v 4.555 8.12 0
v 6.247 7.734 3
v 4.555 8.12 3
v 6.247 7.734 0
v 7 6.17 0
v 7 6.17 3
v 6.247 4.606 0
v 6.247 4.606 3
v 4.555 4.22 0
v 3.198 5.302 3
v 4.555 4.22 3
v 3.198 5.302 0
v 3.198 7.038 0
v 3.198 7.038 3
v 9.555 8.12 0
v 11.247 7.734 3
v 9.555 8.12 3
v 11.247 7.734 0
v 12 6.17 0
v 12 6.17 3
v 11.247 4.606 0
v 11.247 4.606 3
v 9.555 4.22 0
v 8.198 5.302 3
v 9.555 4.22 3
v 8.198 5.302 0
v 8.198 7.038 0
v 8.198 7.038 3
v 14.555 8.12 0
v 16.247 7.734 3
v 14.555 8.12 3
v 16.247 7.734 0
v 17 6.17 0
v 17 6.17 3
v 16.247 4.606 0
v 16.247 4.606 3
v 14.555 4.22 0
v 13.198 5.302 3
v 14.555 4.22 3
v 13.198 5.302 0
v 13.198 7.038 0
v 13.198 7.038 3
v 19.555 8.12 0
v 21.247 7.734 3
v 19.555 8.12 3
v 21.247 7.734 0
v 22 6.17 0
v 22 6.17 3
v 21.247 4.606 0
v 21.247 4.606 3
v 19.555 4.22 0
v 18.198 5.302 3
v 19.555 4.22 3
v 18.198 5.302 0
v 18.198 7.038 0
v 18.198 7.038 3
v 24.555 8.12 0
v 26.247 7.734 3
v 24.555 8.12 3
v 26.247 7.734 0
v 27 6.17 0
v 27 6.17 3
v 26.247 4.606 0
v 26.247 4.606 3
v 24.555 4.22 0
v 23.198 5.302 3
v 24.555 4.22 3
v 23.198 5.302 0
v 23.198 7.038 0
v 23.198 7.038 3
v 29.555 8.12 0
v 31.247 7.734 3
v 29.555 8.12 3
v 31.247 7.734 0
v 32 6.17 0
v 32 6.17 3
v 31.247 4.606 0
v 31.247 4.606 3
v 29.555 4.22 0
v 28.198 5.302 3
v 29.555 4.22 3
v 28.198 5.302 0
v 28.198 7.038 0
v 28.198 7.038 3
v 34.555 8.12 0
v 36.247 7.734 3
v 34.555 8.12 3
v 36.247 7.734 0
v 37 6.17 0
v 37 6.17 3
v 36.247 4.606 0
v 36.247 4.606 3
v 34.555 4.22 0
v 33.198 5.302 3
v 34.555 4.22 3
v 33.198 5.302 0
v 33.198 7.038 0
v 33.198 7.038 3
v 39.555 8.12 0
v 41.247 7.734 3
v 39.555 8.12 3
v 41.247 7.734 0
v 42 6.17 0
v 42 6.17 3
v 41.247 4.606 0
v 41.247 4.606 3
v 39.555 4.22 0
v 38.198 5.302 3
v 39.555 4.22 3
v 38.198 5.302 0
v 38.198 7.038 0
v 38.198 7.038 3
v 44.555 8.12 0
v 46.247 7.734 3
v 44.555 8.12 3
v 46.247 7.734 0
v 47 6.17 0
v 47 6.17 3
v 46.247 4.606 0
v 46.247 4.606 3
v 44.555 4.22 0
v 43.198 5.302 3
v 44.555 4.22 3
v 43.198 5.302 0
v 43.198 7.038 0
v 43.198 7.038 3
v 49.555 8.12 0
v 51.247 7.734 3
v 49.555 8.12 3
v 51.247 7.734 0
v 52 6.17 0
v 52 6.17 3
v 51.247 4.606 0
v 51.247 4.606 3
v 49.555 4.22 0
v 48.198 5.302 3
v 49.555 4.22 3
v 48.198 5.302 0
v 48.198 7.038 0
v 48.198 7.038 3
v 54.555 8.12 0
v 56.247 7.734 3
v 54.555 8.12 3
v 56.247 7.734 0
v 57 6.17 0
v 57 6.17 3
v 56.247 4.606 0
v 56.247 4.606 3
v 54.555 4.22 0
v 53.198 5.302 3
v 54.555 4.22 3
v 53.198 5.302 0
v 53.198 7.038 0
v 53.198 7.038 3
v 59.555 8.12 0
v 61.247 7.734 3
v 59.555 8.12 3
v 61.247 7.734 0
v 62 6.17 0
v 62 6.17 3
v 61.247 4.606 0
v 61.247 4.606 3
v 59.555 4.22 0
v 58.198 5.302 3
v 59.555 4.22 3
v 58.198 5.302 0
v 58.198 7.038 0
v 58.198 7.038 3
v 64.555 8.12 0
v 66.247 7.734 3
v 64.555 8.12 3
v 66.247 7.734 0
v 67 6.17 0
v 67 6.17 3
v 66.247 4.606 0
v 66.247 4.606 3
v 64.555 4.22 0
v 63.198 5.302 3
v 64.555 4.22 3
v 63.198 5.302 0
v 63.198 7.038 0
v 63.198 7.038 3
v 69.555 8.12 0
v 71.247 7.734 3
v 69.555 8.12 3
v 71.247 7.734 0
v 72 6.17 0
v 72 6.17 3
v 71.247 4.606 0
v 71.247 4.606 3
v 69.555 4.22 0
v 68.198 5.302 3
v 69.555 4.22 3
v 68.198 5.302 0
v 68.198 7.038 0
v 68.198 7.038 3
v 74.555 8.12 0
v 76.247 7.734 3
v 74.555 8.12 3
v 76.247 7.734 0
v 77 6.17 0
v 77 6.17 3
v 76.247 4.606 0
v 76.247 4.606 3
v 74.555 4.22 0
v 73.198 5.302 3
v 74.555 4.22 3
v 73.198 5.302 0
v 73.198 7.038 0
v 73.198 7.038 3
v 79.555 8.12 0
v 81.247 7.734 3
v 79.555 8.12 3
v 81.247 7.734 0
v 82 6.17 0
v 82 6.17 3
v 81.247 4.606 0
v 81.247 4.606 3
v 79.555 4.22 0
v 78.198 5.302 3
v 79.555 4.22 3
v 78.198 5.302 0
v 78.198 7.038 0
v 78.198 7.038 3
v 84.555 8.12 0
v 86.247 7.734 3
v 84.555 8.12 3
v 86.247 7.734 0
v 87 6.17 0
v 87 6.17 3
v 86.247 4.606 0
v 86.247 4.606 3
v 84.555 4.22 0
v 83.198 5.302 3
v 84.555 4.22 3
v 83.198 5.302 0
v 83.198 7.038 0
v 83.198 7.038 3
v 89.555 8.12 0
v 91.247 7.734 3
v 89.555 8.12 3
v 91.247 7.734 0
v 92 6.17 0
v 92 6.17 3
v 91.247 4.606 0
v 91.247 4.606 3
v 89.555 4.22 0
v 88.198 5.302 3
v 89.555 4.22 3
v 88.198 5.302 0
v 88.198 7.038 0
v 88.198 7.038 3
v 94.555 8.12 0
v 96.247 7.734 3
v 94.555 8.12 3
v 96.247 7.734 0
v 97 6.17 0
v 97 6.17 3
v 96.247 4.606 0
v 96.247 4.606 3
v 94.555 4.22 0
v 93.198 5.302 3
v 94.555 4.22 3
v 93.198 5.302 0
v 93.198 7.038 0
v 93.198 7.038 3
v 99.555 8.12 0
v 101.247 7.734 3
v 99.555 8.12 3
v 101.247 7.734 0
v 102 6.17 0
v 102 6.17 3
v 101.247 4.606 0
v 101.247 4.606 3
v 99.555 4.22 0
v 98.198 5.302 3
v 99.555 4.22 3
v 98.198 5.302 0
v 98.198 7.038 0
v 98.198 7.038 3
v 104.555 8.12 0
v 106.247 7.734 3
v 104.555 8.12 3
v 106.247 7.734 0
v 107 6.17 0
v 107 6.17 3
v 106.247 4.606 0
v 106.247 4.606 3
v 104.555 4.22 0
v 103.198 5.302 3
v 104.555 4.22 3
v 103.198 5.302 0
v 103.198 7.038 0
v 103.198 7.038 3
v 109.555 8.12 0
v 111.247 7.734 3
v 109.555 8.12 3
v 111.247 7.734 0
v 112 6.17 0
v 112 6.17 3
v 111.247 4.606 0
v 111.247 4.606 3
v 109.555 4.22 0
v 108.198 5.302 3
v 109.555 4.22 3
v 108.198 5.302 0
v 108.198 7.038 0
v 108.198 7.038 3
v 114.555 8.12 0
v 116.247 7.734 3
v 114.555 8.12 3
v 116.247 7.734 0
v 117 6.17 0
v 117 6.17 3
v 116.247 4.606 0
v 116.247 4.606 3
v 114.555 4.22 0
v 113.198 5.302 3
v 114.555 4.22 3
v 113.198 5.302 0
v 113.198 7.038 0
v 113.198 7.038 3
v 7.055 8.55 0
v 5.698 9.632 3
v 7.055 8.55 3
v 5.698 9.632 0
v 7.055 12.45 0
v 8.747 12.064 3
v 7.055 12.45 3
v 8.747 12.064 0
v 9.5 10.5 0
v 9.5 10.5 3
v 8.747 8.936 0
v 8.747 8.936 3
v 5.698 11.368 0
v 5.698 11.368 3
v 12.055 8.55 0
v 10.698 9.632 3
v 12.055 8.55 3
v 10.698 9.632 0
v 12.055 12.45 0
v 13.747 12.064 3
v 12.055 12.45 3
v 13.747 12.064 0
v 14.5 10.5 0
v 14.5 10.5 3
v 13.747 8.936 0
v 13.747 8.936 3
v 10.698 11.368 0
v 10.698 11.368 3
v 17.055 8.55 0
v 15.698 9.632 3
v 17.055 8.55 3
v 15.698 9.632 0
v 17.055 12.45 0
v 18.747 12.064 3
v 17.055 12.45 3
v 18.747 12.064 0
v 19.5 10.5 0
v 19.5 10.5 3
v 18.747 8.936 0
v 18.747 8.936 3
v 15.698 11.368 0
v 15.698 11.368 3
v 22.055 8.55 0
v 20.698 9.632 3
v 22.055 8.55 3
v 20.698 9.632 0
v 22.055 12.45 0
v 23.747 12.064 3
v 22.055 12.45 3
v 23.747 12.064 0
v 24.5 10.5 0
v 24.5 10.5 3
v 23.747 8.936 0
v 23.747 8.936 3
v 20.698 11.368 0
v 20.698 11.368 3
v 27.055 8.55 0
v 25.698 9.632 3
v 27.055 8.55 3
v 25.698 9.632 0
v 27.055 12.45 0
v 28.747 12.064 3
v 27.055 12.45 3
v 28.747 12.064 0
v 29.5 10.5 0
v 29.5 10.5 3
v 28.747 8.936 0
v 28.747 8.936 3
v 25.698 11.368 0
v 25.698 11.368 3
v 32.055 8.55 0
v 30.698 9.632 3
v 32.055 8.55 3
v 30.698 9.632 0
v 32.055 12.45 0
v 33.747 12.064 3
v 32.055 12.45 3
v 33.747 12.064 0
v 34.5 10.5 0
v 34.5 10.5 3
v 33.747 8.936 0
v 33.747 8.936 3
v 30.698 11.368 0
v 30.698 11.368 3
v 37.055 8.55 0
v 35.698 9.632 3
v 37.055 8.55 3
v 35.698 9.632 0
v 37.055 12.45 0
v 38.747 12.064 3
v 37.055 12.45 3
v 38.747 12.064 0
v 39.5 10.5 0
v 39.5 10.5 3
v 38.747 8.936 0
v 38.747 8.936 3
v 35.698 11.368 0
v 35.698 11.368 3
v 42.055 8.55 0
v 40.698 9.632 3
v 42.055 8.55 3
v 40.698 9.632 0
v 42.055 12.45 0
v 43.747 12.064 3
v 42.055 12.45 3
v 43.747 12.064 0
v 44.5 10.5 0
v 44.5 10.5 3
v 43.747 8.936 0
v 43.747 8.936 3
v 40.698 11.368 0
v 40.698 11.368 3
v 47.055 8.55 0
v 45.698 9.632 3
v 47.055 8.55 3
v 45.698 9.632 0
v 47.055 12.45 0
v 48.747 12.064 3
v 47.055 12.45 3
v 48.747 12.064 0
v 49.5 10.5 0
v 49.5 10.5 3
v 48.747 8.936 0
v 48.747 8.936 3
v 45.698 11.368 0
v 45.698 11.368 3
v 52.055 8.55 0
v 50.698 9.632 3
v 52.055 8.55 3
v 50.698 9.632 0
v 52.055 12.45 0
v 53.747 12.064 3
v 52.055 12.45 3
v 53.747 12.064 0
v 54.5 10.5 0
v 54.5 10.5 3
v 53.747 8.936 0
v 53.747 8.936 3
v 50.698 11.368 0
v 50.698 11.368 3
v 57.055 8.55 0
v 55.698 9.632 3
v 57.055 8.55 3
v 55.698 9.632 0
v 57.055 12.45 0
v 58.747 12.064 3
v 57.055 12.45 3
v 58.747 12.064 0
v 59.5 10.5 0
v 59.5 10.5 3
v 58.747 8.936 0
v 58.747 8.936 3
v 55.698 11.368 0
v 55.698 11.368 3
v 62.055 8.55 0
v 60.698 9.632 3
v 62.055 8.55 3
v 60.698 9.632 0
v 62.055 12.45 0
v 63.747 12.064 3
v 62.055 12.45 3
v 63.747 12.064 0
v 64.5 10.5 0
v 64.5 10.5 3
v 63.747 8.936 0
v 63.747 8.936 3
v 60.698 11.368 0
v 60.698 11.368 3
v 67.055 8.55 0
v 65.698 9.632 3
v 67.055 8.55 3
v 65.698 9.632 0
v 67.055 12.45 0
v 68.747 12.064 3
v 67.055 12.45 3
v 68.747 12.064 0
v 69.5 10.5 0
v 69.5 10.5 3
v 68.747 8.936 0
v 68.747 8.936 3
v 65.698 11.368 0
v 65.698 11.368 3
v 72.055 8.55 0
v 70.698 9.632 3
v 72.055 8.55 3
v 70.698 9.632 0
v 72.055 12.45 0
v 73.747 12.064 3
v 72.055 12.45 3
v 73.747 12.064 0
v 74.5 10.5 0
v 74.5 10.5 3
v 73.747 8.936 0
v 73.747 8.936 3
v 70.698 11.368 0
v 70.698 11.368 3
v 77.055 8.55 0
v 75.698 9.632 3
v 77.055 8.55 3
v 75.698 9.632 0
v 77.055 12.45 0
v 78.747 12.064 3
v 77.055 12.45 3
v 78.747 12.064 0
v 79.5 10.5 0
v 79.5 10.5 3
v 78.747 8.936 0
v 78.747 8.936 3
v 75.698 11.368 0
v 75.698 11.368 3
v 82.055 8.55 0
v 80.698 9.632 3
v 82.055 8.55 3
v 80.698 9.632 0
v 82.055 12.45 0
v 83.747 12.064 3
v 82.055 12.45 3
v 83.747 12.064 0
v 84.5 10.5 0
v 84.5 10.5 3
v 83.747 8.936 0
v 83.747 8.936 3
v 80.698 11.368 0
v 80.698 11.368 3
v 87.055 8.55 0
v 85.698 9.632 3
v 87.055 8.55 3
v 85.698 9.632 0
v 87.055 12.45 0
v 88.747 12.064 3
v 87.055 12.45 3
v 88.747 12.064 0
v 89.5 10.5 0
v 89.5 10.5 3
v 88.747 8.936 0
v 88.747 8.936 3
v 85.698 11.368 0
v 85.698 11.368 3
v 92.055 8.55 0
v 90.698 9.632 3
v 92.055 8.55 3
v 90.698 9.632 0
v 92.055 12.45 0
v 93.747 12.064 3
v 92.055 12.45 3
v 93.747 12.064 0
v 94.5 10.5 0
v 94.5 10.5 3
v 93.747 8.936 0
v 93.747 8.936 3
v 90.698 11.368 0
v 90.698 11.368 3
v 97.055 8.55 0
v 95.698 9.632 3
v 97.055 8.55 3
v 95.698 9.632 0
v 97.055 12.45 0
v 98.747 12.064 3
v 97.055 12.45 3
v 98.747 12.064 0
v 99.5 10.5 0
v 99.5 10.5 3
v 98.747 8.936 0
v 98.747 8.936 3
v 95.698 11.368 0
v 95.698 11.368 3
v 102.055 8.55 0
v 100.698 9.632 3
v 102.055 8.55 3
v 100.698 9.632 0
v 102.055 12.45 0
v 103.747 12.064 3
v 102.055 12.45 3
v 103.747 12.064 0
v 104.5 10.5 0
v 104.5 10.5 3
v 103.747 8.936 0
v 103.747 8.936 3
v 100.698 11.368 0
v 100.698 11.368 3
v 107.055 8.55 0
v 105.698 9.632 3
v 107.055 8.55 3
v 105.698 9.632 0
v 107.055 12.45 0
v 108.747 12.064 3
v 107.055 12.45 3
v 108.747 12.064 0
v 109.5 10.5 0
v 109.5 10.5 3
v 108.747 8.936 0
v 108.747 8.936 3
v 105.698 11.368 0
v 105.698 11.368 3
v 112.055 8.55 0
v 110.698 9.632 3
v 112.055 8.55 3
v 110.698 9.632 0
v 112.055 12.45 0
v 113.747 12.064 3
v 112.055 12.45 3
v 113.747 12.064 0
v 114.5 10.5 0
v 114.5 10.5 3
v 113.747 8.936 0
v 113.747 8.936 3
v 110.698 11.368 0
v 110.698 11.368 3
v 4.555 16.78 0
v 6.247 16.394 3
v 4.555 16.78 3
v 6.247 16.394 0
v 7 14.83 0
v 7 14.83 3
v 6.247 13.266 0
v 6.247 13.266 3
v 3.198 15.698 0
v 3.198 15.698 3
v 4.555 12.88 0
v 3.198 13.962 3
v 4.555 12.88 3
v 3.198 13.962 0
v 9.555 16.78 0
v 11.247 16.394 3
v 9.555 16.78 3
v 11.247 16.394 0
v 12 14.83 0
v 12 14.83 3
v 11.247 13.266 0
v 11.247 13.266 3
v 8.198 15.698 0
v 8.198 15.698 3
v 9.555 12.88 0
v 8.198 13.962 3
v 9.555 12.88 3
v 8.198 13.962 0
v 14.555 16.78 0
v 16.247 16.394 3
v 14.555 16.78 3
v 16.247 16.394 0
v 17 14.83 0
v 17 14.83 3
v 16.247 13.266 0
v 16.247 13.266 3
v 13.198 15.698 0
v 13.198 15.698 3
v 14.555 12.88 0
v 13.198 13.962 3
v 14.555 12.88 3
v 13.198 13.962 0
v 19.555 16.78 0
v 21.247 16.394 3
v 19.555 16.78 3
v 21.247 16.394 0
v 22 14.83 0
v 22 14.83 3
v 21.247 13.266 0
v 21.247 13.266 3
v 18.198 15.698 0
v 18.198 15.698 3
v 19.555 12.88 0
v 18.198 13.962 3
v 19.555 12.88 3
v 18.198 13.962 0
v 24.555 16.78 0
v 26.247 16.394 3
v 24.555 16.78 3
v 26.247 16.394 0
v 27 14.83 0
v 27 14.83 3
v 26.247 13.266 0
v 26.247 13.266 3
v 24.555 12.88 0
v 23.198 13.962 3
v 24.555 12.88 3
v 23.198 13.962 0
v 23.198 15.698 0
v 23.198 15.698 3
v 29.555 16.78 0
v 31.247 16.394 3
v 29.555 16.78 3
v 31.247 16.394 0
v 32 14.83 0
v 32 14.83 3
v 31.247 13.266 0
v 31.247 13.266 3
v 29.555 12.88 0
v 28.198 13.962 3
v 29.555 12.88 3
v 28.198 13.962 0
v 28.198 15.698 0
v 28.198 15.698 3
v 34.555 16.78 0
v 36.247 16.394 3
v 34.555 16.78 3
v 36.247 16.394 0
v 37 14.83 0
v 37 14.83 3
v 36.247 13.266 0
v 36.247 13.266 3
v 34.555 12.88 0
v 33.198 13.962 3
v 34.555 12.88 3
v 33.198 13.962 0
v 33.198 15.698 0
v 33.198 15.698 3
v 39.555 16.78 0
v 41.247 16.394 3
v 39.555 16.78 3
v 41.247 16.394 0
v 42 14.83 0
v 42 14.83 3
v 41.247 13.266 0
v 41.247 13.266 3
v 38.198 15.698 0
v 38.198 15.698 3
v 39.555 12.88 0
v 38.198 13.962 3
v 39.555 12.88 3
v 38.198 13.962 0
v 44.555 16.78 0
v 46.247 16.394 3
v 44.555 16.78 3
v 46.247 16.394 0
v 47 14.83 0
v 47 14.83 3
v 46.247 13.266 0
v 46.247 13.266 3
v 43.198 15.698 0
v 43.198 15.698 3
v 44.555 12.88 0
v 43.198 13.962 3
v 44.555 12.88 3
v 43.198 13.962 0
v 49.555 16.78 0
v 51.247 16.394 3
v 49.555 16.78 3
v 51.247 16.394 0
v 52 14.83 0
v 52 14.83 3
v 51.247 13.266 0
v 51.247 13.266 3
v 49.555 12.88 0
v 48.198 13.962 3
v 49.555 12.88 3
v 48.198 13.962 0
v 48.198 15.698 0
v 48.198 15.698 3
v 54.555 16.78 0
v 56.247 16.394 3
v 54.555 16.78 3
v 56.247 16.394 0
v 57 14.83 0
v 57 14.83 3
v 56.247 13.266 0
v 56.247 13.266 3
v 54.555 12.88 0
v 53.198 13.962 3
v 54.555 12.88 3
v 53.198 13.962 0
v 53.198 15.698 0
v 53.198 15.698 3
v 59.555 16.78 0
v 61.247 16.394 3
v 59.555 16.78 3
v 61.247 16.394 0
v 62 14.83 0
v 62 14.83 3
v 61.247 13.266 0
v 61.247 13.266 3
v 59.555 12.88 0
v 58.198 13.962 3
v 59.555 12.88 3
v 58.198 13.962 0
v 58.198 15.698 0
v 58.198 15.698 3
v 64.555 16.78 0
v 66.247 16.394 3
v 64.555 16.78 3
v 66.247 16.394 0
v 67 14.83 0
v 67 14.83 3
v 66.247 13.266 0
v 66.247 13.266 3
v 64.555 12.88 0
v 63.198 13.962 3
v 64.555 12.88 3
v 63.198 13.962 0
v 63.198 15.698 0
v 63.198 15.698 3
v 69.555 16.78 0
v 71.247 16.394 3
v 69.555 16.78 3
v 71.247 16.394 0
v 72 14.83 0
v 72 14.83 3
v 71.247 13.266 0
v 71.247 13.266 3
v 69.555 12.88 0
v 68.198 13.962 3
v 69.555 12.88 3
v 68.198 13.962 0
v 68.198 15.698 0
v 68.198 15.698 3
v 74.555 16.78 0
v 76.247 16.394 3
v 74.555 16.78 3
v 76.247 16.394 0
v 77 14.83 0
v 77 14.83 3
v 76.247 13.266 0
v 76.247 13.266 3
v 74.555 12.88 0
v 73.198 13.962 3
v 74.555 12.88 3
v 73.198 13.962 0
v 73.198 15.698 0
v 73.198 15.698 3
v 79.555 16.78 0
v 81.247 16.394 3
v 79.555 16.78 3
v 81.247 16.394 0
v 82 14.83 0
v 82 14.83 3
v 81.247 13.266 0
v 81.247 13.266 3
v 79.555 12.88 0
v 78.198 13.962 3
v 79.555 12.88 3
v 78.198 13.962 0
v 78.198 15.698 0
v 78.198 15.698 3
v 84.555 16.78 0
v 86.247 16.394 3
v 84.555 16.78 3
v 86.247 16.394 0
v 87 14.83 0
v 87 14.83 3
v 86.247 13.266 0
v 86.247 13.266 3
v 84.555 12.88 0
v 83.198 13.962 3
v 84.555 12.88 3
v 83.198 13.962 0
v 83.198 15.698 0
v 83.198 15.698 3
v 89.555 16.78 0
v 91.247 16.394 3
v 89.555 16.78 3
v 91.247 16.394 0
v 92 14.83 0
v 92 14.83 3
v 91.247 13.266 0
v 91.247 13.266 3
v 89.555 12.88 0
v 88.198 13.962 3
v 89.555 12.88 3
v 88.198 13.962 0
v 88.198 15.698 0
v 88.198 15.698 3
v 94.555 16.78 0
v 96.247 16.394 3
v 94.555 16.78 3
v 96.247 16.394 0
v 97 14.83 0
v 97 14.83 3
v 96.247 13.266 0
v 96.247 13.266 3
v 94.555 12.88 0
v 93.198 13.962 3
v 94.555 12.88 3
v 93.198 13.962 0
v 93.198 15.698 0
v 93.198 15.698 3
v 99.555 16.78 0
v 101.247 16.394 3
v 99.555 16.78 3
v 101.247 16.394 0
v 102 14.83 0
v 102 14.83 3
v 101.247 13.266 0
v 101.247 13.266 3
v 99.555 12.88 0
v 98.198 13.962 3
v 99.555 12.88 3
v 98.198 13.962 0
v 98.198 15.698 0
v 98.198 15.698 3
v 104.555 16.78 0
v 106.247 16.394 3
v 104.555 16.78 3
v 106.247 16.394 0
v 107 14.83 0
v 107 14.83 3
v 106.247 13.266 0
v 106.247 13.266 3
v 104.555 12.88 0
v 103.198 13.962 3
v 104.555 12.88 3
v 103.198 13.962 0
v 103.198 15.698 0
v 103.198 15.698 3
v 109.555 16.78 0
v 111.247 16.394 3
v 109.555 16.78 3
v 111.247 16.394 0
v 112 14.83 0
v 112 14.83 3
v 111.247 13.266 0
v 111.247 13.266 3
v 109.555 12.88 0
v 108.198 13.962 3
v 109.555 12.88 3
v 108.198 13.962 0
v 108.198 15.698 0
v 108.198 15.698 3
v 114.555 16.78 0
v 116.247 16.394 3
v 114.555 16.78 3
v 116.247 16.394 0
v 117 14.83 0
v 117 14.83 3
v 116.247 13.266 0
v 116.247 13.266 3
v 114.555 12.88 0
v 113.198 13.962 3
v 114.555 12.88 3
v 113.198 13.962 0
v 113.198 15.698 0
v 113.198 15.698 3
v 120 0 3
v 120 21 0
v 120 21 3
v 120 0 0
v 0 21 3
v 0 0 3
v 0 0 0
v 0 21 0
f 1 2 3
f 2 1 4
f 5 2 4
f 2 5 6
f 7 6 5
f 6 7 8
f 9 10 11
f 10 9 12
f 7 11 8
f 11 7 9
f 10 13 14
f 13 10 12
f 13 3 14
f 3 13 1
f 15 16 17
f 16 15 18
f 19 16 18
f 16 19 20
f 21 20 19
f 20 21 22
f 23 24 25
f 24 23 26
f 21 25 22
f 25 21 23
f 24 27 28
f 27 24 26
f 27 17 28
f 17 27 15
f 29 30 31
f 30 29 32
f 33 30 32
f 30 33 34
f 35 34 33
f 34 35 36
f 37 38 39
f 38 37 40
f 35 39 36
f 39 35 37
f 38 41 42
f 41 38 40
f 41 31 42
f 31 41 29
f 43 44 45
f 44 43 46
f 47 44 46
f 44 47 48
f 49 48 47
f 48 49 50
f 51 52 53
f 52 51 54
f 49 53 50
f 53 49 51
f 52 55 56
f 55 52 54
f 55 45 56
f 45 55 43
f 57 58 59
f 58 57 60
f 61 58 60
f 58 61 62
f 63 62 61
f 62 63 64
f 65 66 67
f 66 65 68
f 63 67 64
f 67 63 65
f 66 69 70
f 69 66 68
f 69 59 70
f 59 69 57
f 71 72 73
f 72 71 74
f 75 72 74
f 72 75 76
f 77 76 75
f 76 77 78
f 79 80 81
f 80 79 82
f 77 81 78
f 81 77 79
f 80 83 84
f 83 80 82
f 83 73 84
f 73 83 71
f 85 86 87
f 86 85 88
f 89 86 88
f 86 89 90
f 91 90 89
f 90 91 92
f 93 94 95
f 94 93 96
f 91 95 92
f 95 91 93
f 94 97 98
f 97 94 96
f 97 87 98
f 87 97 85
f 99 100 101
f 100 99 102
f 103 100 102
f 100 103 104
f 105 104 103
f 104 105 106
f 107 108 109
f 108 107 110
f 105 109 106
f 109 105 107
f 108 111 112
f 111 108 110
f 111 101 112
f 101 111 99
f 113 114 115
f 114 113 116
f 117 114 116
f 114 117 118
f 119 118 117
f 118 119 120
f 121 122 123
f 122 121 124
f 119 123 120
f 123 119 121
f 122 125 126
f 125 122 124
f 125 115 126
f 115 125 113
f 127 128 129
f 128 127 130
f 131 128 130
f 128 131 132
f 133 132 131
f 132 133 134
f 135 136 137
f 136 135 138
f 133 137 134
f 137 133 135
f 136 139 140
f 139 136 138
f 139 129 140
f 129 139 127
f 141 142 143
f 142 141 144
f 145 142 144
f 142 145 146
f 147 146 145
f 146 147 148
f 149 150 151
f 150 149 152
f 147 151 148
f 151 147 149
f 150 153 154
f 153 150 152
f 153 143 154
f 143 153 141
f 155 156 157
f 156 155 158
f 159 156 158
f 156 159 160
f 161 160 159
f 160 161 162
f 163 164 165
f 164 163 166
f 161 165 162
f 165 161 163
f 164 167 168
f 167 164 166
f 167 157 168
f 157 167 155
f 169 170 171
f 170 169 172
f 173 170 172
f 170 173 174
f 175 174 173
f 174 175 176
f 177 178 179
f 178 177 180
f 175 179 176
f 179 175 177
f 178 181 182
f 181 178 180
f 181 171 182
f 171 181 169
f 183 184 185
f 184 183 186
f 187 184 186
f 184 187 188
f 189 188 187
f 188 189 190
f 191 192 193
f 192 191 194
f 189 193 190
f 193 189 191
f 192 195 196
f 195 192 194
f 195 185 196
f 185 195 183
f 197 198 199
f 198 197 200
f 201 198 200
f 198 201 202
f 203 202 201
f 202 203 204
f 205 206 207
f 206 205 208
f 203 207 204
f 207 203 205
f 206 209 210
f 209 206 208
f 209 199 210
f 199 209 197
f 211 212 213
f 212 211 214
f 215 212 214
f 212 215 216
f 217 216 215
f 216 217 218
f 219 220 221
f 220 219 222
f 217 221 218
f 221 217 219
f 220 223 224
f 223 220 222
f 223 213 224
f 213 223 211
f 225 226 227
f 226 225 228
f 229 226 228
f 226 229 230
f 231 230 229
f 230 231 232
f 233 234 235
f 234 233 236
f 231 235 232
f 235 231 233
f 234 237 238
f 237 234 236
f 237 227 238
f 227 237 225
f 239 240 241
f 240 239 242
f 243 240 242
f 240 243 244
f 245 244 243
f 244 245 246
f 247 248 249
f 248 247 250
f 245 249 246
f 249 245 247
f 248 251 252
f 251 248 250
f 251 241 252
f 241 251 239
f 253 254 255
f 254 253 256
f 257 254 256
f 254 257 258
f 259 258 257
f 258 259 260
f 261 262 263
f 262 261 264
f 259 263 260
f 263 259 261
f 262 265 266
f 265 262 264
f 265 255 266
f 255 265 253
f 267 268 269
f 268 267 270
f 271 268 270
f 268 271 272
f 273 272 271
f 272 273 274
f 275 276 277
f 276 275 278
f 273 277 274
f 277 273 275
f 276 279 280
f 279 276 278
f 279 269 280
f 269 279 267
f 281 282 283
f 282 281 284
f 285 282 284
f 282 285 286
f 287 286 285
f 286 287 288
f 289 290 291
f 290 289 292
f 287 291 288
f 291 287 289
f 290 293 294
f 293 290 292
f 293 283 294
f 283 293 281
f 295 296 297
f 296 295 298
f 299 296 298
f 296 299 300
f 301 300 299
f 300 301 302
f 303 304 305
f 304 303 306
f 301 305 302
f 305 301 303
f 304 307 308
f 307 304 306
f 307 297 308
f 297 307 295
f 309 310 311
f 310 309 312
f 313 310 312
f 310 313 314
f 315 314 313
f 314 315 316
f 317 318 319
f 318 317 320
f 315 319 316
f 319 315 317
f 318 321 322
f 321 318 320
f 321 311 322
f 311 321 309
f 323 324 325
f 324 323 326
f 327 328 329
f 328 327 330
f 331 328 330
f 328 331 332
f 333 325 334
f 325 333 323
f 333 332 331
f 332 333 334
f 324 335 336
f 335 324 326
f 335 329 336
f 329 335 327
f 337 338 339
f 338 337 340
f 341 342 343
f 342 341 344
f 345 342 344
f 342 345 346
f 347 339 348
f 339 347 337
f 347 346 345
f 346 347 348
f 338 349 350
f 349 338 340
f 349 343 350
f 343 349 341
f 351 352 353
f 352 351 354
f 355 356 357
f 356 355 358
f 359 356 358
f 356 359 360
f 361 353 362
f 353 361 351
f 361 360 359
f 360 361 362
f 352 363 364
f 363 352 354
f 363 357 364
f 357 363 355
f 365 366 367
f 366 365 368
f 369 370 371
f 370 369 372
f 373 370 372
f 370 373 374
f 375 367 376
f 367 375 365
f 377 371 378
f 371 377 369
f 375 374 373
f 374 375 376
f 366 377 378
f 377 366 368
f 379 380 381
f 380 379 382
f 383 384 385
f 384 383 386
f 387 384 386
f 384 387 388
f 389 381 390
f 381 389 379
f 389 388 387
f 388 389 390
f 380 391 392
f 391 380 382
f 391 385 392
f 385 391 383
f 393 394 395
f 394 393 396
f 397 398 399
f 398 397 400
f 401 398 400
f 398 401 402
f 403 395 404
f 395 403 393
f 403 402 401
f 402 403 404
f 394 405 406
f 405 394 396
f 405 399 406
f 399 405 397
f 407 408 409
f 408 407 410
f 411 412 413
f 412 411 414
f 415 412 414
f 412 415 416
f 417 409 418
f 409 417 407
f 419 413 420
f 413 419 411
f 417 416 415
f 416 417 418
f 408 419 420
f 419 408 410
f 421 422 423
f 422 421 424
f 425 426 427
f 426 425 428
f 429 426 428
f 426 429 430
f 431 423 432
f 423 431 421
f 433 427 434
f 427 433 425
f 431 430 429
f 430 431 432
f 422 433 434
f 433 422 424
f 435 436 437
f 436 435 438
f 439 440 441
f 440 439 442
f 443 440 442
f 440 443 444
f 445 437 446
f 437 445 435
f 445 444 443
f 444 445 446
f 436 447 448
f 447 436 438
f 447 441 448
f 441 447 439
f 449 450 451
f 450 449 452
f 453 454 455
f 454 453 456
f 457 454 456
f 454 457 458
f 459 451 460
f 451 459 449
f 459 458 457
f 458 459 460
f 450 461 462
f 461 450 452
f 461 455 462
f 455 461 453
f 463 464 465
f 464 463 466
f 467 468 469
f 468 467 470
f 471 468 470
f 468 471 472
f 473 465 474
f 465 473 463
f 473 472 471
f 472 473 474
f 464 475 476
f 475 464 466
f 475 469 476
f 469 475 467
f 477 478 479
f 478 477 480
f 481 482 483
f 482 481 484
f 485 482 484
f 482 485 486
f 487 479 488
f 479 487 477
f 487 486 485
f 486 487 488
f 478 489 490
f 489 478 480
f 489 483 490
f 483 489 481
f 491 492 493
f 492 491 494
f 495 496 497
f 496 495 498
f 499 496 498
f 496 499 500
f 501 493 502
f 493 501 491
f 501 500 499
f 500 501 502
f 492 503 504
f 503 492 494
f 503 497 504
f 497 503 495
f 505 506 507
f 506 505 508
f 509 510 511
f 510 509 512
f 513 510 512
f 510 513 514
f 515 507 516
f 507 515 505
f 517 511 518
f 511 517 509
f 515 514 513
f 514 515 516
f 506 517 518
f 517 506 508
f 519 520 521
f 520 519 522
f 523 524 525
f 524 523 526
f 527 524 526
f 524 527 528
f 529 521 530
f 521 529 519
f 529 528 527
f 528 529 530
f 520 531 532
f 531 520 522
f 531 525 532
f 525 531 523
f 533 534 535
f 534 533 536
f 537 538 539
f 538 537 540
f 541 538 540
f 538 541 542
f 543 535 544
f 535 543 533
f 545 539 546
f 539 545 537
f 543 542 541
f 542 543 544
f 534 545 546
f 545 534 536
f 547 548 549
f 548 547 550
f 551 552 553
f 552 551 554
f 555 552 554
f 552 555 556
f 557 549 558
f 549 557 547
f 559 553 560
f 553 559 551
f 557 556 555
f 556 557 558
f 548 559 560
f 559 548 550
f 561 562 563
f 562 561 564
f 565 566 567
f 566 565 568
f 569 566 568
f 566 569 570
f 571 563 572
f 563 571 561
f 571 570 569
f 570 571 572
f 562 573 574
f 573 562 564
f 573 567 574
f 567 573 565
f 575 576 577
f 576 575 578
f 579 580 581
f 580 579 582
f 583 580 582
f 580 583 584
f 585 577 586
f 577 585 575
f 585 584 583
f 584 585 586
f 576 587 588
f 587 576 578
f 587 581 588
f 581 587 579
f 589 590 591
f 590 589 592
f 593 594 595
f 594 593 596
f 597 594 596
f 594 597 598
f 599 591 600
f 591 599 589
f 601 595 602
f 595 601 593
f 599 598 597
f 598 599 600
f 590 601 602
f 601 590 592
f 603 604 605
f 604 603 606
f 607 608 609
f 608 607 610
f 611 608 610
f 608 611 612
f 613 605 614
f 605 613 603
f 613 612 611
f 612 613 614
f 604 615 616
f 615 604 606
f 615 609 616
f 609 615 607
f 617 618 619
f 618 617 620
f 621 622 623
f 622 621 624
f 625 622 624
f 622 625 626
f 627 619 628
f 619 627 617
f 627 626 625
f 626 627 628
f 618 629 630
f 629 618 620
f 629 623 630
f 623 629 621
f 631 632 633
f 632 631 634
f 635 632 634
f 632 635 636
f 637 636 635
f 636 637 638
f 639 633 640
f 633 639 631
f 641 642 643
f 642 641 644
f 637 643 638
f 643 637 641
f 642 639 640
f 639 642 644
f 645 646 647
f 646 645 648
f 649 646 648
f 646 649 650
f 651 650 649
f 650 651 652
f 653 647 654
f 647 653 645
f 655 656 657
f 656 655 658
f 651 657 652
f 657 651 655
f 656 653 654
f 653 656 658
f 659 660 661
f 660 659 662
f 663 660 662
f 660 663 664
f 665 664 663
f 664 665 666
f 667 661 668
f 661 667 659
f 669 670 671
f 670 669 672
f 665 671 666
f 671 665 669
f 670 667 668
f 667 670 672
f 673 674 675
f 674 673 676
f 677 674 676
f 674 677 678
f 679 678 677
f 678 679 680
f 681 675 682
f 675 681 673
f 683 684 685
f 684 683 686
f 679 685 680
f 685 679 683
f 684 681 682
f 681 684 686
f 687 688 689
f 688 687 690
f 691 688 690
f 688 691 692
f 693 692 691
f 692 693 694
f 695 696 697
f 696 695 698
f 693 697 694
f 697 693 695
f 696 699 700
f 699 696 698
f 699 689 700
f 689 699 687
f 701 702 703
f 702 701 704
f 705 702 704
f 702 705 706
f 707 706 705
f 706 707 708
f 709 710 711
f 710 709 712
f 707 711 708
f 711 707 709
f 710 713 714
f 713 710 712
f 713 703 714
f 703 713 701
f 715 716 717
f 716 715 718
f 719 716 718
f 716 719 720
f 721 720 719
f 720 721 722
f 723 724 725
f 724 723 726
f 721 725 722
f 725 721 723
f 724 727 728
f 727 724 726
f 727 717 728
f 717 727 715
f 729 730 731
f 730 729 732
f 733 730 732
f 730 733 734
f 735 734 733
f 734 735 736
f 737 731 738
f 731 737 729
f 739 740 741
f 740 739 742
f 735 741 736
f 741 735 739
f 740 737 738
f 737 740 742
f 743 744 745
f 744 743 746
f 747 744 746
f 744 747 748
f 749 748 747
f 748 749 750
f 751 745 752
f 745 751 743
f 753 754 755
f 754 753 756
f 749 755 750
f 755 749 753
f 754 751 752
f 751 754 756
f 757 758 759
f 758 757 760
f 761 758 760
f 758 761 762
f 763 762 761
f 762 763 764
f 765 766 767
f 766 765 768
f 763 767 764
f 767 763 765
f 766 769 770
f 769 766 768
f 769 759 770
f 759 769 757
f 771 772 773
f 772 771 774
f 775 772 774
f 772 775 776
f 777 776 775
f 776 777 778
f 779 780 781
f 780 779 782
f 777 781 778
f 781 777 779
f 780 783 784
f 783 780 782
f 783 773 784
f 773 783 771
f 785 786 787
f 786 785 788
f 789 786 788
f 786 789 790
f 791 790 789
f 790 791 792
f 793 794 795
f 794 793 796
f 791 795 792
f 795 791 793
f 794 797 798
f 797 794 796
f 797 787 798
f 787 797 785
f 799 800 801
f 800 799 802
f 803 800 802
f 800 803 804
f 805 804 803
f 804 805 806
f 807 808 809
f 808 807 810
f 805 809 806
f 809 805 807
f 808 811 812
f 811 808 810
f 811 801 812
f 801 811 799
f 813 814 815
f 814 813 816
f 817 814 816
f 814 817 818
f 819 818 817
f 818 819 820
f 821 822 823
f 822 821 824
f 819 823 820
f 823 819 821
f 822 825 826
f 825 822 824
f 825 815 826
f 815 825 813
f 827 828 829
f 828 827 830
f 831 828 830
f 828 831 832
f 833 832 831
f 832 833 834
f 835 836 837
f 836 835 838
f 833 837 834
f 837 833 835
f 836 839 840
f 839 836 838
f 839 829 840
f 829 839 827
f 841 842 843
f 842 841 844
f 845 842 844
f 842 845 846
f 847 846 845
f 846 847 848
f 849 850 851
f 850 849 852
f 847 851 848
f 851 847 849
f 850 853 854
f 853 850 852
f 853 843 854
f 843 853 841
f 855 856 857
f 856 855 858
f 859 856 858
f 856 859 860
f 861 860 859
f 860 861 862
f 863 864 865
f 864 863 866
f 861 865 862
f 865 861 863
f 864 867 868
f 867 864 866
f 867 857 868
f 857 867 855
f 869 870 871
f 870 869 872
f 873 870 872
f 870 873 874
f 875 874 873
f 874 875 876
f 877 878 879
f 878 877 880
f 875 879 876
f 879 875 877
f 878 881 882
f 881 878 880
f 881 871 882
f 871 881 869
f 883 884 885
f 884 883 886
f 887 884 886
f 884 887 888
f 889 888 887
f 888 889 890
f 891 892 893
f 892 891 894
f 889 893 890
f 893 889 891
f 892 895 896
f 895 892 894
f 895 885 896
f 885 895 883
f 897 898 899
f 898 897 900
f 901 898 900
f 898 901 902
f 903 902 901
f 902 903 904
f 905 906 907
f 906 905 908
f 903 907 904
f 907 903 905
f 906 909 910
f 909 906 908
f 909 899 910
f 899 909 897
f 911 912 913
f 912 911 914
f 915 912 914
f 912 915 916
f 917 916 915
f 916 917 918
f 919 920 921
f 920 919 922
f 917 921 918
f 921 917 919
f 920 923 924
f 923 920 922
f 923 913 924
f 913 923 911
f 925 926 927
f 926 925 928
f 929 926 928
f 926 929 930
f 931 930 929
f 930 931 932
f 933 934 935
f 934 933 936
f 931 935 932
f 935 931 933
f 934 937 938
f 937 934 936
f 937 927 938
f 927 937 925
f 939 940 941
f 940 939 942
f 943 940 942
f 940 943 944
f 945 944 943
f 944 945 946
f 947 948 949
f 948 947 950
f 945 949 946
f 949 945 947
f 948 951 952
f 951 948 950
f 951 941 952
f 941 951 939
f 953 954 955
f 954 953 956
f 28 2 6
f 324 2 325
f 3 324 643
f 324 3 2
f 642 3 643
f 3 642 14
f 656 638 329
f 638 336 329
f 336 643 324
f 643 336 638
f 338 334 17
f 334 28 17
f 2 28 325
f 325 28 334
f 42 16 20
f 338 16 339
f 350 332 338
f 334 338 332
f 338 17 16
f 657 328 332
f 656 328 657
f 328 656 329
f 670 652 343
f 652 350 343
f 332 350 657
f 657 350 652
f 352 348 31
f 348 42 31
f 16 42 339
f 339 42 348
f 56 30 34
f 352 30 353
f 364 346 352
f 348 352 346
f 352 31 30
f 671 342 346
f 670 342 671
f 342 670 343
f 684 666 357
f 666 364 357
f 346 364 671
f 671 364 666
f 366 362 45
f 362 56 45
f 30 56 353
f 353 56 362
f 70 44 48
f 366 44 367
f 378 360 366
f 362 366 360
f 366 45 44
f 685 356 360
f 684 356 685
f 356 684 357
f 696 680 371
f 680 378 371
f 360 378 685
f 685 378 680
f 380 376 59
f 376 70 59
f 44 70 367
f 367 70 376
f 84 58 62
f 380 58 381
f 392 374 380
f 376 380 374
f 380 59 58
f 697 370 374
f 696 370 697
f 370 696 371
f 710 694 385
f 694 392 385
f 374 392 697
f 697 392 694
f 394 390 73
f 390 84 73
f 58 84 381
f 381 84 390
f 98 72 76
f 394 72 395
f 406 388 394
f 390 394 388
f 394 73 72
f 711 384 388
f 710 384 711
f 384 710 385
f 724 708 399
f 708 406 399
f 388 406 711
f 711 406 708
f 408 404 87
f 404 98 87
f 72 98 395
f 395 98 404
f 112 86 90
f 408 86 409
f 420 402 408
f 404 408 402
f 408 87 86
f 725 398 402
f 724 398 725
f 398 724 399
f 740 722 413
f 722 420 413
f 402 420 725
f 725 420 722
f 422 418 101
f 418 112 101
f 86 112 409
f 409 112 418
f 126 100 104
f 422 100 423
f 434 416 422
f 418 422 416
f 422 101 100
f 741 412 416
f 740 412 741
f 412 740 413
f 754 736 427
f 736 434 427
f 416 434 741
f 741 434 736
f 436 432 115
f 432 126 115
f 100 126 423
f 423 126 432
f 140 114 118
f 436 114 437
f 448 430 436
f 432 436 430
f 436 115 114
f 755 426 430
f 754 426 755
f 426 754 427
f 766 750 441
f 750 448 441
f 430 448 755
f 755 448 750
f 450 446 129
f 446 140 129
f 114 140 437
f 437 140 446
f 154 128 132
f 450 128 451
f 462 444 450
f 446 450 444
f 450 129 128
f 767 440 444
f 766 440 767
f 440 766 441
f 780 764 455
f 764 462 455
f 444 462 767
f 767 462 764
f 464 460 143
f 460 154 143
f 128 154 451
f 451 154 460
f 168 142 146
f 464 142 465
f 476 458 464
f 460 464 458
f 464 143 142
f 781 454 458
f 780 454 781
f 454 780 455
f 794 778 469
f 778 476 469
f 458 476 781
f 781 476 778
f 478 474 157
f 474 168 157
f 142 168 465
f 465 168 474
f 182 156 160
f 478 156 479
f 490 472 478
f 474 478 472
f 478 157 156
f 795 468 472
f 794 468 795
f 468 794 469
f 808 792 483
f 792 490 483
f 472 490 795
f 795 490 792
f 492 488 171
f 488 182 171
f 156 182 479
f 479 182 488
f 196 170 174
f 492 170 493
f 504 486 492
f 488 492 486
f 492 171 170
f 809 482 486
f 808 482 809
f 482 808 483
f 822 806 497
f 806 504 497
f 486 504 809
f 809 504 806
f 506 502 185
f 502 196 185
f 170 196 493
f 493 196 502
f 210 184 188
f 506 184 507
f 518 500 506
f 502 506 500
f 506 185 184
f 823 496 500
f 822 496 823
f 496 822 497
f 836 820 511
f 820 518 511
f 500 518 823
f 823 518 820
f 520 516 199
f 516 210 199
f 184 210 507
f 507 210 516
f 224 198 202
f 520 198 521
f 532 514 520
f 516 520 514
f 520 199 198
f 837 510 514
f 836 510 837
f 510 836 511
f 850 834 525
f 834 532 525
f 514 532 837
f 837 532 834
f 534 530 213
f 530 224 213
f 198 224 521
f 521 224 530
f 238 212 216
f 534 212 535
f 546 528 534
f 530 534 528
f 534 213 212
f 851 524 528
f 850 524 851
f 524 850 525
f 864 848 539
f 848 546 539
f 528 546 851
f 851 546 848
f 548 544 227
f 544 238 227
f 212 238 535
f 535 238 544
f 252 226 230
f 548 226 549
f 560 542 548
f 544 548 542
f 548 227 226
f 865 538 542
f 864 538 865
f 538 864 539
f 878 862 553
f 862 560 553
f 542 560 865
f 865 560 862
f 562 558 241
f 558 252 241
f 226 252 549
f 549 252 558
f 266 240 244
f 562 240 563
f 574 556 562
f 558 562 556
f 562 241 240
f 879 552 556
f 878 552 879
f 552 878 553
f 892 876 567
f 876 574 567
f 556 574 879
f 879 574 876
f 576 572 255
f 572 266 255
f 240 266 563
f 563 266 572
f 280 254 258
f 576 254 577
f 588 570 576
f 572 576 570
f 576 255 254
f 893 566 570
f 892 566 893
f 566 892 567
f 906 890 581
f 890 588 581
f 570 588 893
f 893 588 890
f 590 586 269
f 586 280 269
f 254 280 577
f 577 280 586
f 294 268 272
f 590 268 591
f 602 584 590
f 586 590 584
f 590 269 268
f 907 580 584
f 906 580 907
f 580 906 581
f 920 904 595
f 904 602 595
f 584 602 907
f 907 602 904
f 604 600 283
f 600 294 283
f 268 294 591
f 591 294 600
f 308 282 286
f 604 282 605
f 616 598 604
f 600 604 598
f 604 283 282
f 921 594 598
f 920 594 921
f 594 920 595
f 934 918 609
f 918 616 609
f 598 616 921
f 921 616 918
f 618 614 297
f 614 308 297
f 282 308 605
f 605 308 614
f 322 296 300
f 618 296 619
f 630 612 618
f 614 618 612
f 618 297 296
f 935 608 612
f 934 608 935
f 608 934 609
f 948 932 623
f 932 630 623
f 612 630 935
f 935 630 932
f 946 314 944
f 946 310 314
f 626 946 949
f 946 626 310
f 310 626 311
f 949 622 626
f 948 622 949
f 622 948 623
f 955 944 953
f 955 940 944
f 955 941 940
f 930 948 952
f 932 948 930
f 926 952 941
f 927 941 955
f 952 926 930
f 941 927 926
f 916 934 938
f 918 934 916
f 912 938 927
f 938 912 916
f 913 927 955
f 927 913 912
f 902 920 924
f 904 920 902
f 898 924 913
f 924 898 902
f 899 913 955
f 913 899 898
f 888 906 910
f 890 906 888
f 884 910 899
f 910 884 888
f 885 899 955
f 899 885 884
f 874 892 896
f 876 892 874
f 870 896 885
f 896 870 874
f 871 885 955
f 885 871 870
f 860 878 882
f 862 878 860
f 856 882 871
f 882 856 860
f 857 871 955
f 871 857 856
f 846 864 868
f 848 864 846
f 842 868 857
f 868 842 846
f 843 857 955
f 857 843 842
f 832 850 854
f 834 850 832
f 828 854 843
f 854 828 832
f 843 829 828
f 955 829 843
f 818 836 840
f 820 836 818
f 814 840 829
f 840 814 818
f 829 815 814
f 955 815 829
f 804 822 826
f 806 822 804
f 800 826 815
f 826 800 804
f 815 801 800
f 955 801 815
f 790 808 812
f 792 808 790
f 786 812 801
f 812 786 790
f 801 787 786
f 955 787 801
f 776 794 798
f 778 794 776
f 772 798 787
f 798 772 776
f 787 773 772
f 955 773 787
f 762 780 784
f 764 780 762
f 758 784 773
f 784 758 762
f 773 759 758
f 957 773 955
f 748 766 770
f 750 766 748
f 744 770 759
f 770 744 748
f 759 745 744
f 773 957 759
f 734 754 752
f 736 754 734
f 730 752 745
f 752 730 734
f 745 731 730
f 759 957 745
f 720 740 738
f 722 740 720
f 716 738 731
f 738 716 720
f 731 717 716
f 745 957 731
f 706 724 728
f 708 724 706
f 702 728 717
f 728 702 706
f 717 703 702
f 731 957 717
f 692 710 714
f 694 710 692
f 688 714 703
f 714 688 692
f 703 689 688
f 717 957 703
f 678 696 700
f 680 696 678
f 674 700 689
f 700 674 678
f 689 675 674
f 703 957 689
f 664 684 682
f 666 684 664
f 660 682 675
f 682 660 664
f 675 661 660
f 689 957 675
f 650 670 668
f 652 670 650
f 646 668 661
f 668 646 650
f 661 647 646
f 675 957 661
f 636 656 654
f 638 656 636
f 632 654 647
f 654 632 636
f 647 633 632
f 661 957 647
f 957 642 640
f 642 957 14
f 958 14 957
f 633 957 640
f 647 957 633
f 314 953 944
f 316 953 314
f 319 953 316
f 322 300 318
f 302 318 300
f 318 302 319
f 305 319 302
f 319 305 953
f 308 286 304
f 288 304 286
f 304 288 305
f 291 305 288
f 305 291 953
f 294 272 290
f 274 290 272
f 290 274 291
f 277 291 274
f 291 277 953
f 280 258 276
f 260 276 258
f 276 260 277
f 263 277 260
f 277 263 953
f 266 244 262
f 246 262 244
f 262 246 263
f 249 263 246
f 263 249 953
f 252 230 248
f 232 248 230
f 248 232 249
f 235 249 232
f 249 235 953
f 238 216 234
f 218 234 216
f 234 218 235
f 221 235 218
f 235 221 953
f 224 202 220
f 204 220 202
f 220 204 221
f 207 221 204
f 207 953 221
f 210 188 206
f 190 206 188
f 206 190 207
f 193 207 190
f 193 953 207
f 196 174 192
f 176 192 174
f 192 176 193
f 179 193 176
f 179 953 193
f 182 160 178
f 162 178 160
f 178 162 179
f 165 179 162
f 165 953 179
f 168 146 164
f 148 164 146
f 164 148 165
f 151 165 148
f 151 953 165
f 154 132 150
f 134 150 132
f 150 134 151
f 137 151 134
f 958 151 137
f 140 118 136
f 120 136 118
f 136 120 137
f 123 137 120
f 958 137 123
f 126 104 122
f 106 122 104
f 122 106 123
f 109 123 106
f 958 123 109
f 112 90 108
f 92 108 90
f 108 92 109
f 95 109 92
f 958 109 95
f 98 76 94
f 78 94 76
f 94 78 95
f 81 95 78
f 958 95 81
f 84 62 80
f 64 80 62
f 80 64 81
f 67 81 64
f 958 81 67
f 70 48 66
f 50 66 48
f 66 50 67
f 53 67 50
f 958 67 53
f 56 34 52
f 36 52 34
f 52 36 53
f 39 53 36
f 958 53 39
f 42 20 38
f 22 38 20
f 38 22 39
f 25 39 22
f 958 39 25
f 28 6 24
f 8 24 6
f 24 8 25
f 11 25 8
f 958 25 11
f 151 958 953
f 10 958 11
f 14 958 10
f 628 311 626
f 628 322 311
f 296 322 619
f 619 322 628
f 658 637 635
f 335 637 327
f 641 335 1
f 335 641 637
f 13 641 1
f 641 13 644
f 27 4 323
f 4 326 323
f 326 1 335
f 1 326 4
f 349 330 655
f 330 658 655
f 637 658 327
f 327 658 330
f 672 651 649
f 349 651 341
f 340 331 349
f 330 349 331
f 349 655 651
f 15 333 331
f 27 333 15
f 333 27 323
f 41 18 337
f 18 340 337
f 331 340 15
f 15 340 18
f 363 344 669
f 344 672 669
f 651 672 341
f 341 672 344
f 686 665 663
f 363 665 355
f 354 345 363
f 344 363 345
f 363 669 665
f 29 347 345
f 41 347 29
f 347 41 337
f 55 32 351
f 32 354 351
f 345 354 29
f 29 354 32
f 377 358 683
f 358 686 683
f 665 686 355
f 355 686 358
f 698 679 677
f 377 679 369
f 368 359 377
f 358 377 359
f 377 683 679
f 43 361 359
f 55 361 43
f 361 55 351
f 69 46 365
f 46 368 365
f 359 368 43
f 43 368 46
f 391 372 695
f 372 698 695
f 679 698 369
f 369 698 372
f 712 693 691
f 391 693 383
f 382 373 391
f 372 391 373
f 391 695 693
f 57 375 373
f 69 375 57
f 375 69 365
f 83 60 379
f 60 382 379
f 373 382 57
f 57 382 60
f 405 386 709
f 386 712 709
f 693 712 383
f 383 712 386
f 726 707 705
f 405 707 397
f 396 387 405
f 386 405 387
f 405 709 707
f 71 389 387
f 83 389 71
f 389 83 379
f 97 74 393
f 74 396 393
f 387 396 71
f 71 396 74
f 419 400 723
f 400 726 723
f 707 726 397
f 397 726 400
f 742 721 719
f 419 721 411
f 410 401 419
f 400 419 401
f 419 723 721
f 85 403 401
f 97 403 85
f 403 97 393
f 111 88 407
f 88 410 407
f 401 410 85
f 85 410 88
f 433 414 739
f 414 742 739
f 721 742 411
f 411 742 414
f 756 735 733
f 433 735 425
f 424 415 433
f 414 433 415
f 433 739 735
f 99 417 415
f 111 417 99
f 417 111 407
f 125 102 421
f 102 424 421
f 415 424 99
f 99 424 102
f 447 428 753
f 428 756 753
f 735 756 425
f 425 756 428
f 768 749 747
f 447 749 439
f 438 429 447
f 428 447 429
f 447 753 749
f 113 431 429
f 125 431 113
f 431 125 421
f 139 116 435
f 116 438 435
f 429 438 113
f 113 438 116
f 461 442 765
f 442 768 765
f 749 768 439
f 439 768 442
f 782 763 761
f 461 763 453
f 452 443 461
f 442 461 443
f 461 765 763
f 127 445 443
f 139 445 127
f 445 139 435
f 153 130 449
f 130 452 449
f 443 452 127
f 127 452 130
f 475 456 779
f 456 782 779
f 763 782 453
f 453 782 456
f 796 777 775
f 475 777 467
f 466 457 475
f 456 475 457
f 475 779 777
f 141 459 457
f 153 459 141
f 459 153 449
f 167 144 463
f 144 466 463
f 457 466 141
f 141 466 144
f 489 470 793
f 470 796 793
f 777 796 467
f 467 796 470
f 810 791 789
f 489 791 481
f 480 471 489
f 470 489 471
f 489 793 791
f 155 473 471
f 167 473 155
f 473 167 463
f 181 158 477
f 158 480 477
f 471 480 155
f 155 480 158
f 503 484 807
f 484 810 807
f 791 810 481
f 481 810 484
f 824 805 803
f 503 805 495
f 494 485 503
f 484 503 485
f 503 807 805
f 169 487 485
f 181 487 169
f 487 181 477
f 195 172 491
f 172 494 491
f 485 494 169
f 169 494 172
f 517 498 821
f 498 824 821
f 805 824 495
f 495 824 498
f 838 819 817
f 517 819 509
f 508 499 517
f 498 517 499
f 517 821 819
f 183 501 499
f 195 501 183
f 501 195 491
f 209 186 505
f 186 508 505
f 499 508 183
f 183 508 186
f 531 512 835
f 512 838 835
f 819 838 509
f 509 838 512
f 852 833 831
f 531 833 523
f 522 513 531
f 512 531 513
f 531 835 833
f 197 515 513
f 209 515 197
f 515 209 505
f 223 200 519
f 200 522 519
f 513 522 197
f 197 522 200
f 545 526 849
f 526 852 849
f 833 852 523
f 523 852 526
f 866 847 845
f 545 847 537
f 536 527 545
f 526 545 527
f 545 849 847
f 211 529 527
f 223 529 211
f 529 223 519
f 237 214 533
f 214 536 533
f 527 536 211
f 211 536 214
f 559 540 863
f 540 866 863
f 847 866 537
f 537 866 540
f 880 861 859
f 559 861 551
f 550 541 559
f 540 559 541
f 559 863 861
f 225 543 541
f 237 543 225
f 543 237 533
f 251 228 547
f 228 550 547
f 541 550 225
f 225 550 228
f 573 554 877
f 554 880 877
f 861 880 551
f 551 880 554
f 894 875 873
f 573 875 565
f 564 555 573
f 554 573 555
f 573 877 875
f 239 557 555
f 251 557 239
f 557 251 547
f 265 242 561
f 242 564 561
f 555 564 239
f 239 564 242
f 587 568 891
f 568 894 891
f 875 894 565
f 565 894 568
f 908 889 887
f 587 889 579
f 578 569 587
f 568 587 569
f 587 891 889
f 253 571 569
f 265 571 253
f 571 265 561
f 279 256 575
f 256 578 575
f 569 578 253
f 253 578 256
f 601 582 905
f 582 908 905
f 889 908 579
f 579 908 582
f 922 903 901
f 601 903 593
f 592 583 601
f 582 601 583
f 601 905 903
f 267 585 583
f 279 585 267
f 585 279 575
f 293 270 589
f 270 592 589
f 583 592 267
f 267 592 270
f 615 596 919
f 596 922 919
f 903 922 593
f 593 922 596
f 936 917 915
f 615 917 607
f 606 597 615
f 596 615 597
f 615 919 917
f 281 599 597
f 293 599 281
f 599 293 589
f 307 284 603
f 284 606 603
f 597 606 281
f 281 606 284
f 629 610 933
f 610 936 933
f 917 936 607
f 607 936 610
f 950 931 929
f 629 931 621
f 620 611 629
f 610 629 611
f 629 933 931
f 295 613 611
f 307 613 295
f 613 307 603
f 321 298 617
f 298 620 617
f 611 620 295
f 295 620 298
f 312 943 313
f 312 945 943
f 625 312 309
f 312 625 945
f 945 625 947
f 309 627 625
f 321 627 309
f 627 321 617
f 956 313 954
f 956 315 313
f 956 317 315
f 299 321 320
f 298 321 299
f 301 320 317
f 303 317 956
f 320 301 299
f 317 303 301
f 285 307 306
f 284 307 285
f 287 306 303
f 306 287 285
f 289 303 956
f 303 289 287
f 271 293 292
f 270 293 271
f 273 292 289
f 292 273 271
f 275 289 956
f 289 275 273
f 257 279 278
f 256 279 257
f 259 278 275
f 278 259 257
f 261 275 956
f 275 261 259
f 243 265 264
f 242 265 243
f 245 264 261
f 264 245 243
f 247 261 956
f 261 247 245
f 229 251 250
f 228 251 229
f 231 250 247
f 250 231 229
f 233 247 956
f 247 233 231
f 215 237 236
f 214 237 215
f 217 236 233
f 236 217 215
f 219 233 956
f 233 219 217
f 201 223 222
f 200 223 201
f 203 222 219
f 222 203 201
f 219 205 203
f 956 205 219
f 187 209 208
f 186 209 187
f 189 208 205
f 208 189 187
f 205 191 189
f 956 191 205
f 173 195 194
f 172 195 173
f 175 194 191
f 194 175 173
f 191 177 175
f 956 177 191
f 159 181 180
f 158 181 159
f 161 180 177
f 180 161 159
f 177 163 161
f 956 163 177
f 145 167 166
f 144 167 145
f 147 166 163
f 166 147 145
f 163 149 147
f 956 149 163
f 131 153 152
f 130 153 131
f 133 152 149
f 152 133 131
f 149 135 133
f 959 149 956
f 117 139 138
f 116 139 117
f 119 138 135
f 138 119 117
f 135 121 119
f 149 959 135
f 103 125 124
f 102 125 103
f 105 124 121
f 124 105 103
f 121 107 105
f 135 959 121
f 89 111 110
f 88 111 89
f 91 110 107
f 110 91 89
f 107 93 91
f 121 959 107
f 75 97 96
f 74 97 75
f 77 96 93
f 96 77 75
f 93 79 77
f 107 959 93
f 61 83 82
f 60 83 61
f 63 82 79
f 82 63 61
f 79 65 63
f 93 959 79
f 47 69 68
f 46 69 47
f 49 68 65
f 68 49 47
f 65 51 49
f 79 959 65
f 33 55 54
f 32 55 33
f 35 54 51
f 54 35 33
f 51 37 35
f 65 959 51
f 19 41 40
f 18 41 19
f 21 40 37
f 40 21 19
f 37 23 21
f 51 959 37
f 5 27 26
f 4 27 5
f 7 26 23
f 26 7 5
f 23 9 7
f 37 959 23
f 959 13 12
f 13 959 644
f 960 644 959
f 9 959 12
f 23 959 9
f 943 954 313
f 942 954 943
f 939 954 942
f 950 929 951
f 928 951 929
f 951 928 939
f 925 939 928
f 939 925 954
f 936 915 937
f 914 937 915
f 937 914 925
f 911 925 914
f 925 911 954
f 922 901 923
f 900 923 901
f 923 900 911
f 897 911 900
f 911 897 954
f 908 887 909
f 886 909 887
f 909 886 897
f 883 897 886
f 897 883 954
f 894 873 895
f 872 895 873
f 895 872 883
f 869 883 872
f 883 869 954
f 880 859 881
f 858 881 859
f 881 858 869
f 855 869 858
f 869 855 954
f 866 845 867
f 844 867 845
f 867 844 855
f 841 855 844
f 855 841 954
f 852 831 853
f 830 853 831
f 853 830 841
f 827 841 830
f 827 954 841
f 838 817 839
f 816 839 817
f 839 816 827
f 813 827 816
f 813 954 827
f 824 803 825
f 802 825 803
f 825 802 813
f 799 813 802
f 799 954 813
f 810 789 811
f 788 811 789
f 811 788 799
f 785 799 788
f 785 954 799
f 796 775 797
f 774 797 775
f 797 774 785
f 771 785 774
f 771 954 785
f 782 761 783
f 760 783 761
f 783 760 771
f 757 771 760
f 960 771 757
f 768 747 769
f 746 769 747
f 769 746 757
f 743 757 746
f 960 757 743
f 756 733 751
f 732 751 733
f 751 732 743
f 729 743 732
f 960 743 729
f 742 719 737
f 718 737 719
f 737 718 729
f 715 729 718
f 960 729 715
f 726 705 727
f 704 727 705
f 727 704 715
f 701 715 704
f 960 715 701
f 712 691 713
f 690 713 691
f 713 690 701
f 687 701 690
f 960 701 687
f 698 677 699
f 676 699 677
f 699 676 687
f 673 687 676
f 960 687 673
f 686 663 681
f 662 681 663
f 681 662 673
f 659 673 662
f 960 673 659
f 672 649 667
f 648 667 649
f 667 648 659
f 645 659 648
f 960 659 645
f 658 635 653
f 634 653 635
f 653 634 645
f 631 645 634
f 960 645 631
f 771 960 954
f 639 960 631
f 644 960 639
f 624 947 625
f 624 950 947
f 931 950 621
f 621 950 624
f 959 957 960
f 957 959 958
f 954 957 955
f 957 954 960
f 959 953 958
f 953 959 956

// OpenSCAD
/*
 * pegboard.scad - library for generating pegboard and grids of pegs/holes
 *
 * Copyright 2019 Craig Ringer <ringerc@ringerc.id.au>
 *
 * BSD Licensed
 */

// if negative, print
negative = false;

// Length (mm) of board section (x axis)
p_board_length = 120;
// Width (mm) of board section (y axis)
p_board_width = 21;
// Depth (mm) of board section (z axis)
p_board_thickness = 3;

// Diameter of holes in board
p_hole_diameter = 4.0;
// Hole pitch (distance between centers of holes)
p_hole_pitch = 5.0;
// Should holes be in a packed triangular environment (true) or a regular grid (false)
p_hole_hexpattern = true;

// Margins around the edges of the board where no holes should be placed. Can be a 2-array [x,y] or a scalar. Actual margins will be slightly larger because the hole grid will get centered.
p_beam_margins = p_hole_pitch/2;

/*
 * Example usage:
 *
 * pegboard([board_length, board_width, board_thickness],
 *              peg_diameter, peg_pitch, hole_hexpattern,
 *              beam_margins);
 *
 */

/* [Hidden] */

module pegboard(dims, hole_diameter, hole_pitch, hexpattern = true, margins = undef, center = true, hole_depth = undef)
{
    t_length = dims[0]; // x
    t_height = dims[1]; // y
    t_thickness = dims[2]; // z

    hole_depth =
        hole_depth == undef ? t_thickness: hole_depth;

    // margins can be an xy array or a scalar, or unset. Negative
    // margins are allowed.
    margin_x = margins == undef ? hole_diameter/2 :
                margins[0] == undef ? margins : margins[0];
    margin_y = margins[1] == undef ? margin_x : margins[1];

    punchthrough_slop = 0.1;

    // Make sure the pegs punch fully out the top, and the bottom if
    // we're going through both sides.
    peg_zoff = hole_depth >= t_thickness ? -punchthrough_slop : 0;
    peg_length = hole_depth + punchthrough_slop - peg_zoff;

    difference() {
        cube([t_length, t_height, t_thickness]);


        // Defend against floating point issues with holes
        // that fully punch out of the object by pushing
        // them right through. Extra height will be added
        // to the hole being punched to compensate.
        translate([0,0,peg_zoff])
            peg_grid([t_length,t_height,peg_length], hole_diameter, hole_pitch, hexpattern, [margin_x, margin_y], center)

            {
                // Hack to allow tests etc
                assert($strip_ncols != undef);
                assert($strip_nrows != undef);
                let ($strip_ncols = $strip_ncols,
                    $strip_nrows = $strip_nrows,
                    $pegboard_running_tests = true)
                children();

            }
    }
}

module peg_grid(dims, peg_diameter, peg_pitch, hexpattern=true, margins=0, center = true)
{
    t_length = dims[0]; // x
    t_height = dims[1]; // y
    peg_length = dims[2]; // z

    // margins can be an xy array or a scalar, or unset. Negative
    // margins are allowed.
    margin_x = margins == undef ? 0 : margins[0] == undef ? margins : margins[0];
    margin_y = margins[1] == undef ? margin_x : margins[1];

    assert(t_length > 0);
    assert(t_height > 0);
    assert(peg_length > 0);
    assert(peg_diameter > 0);
    assert(peg_pitch >= 0);
    assert(margin_x != undef);
    assert(margin_y != undef);

    /*
     * distance between centers of two adjacent holes in the same row.
     */
    xpitch = peg_pitch;
    /*
     * Y gap between lines drawn through centers of holes in two
     *  adjacent rows. If hexpatterned then there are equilateral
     * triangles between centers of each row; the pitch is the
     * hypotenuse so the y-gap is the long side of the triangle
     * formed between the y-axis and the line between the centers.
     */
    ypitch = xpitch * (hexpattern ? sin(60) : 1);
    nrows = 1 + max(0, floor(
        (t_height - margin_y * 2 - peg_diameter)/ypitch));
    ncols = 1 + max(0, floor(
        (t_length - margin_x * 2 - peg_diameter)/peg_pitch));

    assert(nrows != undef && nrows >= 0);
    assert(ncols != undef && ncols >= 0);
    assert((xpitch > 0 && ncols > 0) || ncols == 0);
    assert((ypitch > 0 && nrows > 0) || nrows == 0);

    /*
     * Compute bridge size for reporting use. Bridge min
     * size should not vary based on hexpattern since we x-offset
     * to compensate for the closer rows.
     */
    bridge_size = (peg_pitch - peg_diameter);

    /*
     * Work out how much space is left once we pack in the hole grid
     * area and subtract the margins. If we pad the margins by this
     * leftover/unused space the grid will be centered.
     */
    unused_x = t_length - margin_x * 2 - xpitch * (ncols-1) - peg_diameter;
    unused_y = t_height - margin_y * 2 - ypitch * (nrows-1) - peg_diameter;
    adjusted_margin_x = margin_x + (center ? unused_x / 2 : 0);
    adjusted_margin_y = margin_y + (center ? unused_y / 2 : 0);

    //echo(str("pegboard or peg_grid: ", t_length, "x", t_height, " margins ", adjusted_margin_x, "x", adjusted_margin_y, " rows ", nrows, " cols ", ncols, , " holes diameter ", peg_diameter, (hexpattern ? " hexpatterned" : " straight"), " at pitch ", peg_pitch, " (bridges ", bridge_size, ")"));

    translate([adjusted_margin_x + peg_diameter/2,
            adjusted_margin_y + peg_diameter/2, 0])
        union() {
            for (r = [0 : 1 : nrows - 1])
            {
                for (i = [0 : 1 : ncols - 1])
                {
                    /*
                     * For hexpatterned holes, t_ncols is computed to fit
                     * the non-offset row within the margins. The last
                     * hole of the offset row won't fit and must be
                     * omitted.
                     */
                    if (!(hexpattern && r % 2 == 1 && i == ncols - 1))
                    {
                        // Handle row hexpattern
                        translate(
                            hexpattern ?
                            /*
                             * Rows are hexpatterned so the y-offset is
                             * sin(45deg) of the pitch and every second
                             * row is inset by half the pitch.
                             */
                                [(r % 2)*xpitch/2 + i*xpitch, r * ypitch, 0]
                            :
                                // Not hexpatterned, regular grid
                                    [i*xpitch, r * ypitch, 0]
                        )
                            cylinder(d=peg_diameter,
                            h=peg_length);
                    }
                }
            }
        };


    /*
     * OpenSCAD doesn't let us assign values to outer scopes. Nor does
     * it let us pass functions as objects. So to allow assertions etc,
     * permit definition of child objects here but discard the product.
     *
     * There must be a better way to do this; what we really want to
     * do is pass a function to evaluate, or export some values to
     * the outer scope.
     */
    let ($strip_ncols = ncols,
        $strip_nrows = nrows,
        $pegboard_running_tests = true)
    children();
}



if (negative) {
    peg_grid([p_board_length, p_board_width, p_board_thickness],
    p_hole_diameter, p_hole_pitch, p_hole_hexpattern,
    p_beam_margins);
}
else
{
    pegboard([p_board_length, p_board_width, p_board_thickness],
    p_hole_diameter, p_hole_pitch, p_hole_hexpattern,
    p_beam_margins);
}
